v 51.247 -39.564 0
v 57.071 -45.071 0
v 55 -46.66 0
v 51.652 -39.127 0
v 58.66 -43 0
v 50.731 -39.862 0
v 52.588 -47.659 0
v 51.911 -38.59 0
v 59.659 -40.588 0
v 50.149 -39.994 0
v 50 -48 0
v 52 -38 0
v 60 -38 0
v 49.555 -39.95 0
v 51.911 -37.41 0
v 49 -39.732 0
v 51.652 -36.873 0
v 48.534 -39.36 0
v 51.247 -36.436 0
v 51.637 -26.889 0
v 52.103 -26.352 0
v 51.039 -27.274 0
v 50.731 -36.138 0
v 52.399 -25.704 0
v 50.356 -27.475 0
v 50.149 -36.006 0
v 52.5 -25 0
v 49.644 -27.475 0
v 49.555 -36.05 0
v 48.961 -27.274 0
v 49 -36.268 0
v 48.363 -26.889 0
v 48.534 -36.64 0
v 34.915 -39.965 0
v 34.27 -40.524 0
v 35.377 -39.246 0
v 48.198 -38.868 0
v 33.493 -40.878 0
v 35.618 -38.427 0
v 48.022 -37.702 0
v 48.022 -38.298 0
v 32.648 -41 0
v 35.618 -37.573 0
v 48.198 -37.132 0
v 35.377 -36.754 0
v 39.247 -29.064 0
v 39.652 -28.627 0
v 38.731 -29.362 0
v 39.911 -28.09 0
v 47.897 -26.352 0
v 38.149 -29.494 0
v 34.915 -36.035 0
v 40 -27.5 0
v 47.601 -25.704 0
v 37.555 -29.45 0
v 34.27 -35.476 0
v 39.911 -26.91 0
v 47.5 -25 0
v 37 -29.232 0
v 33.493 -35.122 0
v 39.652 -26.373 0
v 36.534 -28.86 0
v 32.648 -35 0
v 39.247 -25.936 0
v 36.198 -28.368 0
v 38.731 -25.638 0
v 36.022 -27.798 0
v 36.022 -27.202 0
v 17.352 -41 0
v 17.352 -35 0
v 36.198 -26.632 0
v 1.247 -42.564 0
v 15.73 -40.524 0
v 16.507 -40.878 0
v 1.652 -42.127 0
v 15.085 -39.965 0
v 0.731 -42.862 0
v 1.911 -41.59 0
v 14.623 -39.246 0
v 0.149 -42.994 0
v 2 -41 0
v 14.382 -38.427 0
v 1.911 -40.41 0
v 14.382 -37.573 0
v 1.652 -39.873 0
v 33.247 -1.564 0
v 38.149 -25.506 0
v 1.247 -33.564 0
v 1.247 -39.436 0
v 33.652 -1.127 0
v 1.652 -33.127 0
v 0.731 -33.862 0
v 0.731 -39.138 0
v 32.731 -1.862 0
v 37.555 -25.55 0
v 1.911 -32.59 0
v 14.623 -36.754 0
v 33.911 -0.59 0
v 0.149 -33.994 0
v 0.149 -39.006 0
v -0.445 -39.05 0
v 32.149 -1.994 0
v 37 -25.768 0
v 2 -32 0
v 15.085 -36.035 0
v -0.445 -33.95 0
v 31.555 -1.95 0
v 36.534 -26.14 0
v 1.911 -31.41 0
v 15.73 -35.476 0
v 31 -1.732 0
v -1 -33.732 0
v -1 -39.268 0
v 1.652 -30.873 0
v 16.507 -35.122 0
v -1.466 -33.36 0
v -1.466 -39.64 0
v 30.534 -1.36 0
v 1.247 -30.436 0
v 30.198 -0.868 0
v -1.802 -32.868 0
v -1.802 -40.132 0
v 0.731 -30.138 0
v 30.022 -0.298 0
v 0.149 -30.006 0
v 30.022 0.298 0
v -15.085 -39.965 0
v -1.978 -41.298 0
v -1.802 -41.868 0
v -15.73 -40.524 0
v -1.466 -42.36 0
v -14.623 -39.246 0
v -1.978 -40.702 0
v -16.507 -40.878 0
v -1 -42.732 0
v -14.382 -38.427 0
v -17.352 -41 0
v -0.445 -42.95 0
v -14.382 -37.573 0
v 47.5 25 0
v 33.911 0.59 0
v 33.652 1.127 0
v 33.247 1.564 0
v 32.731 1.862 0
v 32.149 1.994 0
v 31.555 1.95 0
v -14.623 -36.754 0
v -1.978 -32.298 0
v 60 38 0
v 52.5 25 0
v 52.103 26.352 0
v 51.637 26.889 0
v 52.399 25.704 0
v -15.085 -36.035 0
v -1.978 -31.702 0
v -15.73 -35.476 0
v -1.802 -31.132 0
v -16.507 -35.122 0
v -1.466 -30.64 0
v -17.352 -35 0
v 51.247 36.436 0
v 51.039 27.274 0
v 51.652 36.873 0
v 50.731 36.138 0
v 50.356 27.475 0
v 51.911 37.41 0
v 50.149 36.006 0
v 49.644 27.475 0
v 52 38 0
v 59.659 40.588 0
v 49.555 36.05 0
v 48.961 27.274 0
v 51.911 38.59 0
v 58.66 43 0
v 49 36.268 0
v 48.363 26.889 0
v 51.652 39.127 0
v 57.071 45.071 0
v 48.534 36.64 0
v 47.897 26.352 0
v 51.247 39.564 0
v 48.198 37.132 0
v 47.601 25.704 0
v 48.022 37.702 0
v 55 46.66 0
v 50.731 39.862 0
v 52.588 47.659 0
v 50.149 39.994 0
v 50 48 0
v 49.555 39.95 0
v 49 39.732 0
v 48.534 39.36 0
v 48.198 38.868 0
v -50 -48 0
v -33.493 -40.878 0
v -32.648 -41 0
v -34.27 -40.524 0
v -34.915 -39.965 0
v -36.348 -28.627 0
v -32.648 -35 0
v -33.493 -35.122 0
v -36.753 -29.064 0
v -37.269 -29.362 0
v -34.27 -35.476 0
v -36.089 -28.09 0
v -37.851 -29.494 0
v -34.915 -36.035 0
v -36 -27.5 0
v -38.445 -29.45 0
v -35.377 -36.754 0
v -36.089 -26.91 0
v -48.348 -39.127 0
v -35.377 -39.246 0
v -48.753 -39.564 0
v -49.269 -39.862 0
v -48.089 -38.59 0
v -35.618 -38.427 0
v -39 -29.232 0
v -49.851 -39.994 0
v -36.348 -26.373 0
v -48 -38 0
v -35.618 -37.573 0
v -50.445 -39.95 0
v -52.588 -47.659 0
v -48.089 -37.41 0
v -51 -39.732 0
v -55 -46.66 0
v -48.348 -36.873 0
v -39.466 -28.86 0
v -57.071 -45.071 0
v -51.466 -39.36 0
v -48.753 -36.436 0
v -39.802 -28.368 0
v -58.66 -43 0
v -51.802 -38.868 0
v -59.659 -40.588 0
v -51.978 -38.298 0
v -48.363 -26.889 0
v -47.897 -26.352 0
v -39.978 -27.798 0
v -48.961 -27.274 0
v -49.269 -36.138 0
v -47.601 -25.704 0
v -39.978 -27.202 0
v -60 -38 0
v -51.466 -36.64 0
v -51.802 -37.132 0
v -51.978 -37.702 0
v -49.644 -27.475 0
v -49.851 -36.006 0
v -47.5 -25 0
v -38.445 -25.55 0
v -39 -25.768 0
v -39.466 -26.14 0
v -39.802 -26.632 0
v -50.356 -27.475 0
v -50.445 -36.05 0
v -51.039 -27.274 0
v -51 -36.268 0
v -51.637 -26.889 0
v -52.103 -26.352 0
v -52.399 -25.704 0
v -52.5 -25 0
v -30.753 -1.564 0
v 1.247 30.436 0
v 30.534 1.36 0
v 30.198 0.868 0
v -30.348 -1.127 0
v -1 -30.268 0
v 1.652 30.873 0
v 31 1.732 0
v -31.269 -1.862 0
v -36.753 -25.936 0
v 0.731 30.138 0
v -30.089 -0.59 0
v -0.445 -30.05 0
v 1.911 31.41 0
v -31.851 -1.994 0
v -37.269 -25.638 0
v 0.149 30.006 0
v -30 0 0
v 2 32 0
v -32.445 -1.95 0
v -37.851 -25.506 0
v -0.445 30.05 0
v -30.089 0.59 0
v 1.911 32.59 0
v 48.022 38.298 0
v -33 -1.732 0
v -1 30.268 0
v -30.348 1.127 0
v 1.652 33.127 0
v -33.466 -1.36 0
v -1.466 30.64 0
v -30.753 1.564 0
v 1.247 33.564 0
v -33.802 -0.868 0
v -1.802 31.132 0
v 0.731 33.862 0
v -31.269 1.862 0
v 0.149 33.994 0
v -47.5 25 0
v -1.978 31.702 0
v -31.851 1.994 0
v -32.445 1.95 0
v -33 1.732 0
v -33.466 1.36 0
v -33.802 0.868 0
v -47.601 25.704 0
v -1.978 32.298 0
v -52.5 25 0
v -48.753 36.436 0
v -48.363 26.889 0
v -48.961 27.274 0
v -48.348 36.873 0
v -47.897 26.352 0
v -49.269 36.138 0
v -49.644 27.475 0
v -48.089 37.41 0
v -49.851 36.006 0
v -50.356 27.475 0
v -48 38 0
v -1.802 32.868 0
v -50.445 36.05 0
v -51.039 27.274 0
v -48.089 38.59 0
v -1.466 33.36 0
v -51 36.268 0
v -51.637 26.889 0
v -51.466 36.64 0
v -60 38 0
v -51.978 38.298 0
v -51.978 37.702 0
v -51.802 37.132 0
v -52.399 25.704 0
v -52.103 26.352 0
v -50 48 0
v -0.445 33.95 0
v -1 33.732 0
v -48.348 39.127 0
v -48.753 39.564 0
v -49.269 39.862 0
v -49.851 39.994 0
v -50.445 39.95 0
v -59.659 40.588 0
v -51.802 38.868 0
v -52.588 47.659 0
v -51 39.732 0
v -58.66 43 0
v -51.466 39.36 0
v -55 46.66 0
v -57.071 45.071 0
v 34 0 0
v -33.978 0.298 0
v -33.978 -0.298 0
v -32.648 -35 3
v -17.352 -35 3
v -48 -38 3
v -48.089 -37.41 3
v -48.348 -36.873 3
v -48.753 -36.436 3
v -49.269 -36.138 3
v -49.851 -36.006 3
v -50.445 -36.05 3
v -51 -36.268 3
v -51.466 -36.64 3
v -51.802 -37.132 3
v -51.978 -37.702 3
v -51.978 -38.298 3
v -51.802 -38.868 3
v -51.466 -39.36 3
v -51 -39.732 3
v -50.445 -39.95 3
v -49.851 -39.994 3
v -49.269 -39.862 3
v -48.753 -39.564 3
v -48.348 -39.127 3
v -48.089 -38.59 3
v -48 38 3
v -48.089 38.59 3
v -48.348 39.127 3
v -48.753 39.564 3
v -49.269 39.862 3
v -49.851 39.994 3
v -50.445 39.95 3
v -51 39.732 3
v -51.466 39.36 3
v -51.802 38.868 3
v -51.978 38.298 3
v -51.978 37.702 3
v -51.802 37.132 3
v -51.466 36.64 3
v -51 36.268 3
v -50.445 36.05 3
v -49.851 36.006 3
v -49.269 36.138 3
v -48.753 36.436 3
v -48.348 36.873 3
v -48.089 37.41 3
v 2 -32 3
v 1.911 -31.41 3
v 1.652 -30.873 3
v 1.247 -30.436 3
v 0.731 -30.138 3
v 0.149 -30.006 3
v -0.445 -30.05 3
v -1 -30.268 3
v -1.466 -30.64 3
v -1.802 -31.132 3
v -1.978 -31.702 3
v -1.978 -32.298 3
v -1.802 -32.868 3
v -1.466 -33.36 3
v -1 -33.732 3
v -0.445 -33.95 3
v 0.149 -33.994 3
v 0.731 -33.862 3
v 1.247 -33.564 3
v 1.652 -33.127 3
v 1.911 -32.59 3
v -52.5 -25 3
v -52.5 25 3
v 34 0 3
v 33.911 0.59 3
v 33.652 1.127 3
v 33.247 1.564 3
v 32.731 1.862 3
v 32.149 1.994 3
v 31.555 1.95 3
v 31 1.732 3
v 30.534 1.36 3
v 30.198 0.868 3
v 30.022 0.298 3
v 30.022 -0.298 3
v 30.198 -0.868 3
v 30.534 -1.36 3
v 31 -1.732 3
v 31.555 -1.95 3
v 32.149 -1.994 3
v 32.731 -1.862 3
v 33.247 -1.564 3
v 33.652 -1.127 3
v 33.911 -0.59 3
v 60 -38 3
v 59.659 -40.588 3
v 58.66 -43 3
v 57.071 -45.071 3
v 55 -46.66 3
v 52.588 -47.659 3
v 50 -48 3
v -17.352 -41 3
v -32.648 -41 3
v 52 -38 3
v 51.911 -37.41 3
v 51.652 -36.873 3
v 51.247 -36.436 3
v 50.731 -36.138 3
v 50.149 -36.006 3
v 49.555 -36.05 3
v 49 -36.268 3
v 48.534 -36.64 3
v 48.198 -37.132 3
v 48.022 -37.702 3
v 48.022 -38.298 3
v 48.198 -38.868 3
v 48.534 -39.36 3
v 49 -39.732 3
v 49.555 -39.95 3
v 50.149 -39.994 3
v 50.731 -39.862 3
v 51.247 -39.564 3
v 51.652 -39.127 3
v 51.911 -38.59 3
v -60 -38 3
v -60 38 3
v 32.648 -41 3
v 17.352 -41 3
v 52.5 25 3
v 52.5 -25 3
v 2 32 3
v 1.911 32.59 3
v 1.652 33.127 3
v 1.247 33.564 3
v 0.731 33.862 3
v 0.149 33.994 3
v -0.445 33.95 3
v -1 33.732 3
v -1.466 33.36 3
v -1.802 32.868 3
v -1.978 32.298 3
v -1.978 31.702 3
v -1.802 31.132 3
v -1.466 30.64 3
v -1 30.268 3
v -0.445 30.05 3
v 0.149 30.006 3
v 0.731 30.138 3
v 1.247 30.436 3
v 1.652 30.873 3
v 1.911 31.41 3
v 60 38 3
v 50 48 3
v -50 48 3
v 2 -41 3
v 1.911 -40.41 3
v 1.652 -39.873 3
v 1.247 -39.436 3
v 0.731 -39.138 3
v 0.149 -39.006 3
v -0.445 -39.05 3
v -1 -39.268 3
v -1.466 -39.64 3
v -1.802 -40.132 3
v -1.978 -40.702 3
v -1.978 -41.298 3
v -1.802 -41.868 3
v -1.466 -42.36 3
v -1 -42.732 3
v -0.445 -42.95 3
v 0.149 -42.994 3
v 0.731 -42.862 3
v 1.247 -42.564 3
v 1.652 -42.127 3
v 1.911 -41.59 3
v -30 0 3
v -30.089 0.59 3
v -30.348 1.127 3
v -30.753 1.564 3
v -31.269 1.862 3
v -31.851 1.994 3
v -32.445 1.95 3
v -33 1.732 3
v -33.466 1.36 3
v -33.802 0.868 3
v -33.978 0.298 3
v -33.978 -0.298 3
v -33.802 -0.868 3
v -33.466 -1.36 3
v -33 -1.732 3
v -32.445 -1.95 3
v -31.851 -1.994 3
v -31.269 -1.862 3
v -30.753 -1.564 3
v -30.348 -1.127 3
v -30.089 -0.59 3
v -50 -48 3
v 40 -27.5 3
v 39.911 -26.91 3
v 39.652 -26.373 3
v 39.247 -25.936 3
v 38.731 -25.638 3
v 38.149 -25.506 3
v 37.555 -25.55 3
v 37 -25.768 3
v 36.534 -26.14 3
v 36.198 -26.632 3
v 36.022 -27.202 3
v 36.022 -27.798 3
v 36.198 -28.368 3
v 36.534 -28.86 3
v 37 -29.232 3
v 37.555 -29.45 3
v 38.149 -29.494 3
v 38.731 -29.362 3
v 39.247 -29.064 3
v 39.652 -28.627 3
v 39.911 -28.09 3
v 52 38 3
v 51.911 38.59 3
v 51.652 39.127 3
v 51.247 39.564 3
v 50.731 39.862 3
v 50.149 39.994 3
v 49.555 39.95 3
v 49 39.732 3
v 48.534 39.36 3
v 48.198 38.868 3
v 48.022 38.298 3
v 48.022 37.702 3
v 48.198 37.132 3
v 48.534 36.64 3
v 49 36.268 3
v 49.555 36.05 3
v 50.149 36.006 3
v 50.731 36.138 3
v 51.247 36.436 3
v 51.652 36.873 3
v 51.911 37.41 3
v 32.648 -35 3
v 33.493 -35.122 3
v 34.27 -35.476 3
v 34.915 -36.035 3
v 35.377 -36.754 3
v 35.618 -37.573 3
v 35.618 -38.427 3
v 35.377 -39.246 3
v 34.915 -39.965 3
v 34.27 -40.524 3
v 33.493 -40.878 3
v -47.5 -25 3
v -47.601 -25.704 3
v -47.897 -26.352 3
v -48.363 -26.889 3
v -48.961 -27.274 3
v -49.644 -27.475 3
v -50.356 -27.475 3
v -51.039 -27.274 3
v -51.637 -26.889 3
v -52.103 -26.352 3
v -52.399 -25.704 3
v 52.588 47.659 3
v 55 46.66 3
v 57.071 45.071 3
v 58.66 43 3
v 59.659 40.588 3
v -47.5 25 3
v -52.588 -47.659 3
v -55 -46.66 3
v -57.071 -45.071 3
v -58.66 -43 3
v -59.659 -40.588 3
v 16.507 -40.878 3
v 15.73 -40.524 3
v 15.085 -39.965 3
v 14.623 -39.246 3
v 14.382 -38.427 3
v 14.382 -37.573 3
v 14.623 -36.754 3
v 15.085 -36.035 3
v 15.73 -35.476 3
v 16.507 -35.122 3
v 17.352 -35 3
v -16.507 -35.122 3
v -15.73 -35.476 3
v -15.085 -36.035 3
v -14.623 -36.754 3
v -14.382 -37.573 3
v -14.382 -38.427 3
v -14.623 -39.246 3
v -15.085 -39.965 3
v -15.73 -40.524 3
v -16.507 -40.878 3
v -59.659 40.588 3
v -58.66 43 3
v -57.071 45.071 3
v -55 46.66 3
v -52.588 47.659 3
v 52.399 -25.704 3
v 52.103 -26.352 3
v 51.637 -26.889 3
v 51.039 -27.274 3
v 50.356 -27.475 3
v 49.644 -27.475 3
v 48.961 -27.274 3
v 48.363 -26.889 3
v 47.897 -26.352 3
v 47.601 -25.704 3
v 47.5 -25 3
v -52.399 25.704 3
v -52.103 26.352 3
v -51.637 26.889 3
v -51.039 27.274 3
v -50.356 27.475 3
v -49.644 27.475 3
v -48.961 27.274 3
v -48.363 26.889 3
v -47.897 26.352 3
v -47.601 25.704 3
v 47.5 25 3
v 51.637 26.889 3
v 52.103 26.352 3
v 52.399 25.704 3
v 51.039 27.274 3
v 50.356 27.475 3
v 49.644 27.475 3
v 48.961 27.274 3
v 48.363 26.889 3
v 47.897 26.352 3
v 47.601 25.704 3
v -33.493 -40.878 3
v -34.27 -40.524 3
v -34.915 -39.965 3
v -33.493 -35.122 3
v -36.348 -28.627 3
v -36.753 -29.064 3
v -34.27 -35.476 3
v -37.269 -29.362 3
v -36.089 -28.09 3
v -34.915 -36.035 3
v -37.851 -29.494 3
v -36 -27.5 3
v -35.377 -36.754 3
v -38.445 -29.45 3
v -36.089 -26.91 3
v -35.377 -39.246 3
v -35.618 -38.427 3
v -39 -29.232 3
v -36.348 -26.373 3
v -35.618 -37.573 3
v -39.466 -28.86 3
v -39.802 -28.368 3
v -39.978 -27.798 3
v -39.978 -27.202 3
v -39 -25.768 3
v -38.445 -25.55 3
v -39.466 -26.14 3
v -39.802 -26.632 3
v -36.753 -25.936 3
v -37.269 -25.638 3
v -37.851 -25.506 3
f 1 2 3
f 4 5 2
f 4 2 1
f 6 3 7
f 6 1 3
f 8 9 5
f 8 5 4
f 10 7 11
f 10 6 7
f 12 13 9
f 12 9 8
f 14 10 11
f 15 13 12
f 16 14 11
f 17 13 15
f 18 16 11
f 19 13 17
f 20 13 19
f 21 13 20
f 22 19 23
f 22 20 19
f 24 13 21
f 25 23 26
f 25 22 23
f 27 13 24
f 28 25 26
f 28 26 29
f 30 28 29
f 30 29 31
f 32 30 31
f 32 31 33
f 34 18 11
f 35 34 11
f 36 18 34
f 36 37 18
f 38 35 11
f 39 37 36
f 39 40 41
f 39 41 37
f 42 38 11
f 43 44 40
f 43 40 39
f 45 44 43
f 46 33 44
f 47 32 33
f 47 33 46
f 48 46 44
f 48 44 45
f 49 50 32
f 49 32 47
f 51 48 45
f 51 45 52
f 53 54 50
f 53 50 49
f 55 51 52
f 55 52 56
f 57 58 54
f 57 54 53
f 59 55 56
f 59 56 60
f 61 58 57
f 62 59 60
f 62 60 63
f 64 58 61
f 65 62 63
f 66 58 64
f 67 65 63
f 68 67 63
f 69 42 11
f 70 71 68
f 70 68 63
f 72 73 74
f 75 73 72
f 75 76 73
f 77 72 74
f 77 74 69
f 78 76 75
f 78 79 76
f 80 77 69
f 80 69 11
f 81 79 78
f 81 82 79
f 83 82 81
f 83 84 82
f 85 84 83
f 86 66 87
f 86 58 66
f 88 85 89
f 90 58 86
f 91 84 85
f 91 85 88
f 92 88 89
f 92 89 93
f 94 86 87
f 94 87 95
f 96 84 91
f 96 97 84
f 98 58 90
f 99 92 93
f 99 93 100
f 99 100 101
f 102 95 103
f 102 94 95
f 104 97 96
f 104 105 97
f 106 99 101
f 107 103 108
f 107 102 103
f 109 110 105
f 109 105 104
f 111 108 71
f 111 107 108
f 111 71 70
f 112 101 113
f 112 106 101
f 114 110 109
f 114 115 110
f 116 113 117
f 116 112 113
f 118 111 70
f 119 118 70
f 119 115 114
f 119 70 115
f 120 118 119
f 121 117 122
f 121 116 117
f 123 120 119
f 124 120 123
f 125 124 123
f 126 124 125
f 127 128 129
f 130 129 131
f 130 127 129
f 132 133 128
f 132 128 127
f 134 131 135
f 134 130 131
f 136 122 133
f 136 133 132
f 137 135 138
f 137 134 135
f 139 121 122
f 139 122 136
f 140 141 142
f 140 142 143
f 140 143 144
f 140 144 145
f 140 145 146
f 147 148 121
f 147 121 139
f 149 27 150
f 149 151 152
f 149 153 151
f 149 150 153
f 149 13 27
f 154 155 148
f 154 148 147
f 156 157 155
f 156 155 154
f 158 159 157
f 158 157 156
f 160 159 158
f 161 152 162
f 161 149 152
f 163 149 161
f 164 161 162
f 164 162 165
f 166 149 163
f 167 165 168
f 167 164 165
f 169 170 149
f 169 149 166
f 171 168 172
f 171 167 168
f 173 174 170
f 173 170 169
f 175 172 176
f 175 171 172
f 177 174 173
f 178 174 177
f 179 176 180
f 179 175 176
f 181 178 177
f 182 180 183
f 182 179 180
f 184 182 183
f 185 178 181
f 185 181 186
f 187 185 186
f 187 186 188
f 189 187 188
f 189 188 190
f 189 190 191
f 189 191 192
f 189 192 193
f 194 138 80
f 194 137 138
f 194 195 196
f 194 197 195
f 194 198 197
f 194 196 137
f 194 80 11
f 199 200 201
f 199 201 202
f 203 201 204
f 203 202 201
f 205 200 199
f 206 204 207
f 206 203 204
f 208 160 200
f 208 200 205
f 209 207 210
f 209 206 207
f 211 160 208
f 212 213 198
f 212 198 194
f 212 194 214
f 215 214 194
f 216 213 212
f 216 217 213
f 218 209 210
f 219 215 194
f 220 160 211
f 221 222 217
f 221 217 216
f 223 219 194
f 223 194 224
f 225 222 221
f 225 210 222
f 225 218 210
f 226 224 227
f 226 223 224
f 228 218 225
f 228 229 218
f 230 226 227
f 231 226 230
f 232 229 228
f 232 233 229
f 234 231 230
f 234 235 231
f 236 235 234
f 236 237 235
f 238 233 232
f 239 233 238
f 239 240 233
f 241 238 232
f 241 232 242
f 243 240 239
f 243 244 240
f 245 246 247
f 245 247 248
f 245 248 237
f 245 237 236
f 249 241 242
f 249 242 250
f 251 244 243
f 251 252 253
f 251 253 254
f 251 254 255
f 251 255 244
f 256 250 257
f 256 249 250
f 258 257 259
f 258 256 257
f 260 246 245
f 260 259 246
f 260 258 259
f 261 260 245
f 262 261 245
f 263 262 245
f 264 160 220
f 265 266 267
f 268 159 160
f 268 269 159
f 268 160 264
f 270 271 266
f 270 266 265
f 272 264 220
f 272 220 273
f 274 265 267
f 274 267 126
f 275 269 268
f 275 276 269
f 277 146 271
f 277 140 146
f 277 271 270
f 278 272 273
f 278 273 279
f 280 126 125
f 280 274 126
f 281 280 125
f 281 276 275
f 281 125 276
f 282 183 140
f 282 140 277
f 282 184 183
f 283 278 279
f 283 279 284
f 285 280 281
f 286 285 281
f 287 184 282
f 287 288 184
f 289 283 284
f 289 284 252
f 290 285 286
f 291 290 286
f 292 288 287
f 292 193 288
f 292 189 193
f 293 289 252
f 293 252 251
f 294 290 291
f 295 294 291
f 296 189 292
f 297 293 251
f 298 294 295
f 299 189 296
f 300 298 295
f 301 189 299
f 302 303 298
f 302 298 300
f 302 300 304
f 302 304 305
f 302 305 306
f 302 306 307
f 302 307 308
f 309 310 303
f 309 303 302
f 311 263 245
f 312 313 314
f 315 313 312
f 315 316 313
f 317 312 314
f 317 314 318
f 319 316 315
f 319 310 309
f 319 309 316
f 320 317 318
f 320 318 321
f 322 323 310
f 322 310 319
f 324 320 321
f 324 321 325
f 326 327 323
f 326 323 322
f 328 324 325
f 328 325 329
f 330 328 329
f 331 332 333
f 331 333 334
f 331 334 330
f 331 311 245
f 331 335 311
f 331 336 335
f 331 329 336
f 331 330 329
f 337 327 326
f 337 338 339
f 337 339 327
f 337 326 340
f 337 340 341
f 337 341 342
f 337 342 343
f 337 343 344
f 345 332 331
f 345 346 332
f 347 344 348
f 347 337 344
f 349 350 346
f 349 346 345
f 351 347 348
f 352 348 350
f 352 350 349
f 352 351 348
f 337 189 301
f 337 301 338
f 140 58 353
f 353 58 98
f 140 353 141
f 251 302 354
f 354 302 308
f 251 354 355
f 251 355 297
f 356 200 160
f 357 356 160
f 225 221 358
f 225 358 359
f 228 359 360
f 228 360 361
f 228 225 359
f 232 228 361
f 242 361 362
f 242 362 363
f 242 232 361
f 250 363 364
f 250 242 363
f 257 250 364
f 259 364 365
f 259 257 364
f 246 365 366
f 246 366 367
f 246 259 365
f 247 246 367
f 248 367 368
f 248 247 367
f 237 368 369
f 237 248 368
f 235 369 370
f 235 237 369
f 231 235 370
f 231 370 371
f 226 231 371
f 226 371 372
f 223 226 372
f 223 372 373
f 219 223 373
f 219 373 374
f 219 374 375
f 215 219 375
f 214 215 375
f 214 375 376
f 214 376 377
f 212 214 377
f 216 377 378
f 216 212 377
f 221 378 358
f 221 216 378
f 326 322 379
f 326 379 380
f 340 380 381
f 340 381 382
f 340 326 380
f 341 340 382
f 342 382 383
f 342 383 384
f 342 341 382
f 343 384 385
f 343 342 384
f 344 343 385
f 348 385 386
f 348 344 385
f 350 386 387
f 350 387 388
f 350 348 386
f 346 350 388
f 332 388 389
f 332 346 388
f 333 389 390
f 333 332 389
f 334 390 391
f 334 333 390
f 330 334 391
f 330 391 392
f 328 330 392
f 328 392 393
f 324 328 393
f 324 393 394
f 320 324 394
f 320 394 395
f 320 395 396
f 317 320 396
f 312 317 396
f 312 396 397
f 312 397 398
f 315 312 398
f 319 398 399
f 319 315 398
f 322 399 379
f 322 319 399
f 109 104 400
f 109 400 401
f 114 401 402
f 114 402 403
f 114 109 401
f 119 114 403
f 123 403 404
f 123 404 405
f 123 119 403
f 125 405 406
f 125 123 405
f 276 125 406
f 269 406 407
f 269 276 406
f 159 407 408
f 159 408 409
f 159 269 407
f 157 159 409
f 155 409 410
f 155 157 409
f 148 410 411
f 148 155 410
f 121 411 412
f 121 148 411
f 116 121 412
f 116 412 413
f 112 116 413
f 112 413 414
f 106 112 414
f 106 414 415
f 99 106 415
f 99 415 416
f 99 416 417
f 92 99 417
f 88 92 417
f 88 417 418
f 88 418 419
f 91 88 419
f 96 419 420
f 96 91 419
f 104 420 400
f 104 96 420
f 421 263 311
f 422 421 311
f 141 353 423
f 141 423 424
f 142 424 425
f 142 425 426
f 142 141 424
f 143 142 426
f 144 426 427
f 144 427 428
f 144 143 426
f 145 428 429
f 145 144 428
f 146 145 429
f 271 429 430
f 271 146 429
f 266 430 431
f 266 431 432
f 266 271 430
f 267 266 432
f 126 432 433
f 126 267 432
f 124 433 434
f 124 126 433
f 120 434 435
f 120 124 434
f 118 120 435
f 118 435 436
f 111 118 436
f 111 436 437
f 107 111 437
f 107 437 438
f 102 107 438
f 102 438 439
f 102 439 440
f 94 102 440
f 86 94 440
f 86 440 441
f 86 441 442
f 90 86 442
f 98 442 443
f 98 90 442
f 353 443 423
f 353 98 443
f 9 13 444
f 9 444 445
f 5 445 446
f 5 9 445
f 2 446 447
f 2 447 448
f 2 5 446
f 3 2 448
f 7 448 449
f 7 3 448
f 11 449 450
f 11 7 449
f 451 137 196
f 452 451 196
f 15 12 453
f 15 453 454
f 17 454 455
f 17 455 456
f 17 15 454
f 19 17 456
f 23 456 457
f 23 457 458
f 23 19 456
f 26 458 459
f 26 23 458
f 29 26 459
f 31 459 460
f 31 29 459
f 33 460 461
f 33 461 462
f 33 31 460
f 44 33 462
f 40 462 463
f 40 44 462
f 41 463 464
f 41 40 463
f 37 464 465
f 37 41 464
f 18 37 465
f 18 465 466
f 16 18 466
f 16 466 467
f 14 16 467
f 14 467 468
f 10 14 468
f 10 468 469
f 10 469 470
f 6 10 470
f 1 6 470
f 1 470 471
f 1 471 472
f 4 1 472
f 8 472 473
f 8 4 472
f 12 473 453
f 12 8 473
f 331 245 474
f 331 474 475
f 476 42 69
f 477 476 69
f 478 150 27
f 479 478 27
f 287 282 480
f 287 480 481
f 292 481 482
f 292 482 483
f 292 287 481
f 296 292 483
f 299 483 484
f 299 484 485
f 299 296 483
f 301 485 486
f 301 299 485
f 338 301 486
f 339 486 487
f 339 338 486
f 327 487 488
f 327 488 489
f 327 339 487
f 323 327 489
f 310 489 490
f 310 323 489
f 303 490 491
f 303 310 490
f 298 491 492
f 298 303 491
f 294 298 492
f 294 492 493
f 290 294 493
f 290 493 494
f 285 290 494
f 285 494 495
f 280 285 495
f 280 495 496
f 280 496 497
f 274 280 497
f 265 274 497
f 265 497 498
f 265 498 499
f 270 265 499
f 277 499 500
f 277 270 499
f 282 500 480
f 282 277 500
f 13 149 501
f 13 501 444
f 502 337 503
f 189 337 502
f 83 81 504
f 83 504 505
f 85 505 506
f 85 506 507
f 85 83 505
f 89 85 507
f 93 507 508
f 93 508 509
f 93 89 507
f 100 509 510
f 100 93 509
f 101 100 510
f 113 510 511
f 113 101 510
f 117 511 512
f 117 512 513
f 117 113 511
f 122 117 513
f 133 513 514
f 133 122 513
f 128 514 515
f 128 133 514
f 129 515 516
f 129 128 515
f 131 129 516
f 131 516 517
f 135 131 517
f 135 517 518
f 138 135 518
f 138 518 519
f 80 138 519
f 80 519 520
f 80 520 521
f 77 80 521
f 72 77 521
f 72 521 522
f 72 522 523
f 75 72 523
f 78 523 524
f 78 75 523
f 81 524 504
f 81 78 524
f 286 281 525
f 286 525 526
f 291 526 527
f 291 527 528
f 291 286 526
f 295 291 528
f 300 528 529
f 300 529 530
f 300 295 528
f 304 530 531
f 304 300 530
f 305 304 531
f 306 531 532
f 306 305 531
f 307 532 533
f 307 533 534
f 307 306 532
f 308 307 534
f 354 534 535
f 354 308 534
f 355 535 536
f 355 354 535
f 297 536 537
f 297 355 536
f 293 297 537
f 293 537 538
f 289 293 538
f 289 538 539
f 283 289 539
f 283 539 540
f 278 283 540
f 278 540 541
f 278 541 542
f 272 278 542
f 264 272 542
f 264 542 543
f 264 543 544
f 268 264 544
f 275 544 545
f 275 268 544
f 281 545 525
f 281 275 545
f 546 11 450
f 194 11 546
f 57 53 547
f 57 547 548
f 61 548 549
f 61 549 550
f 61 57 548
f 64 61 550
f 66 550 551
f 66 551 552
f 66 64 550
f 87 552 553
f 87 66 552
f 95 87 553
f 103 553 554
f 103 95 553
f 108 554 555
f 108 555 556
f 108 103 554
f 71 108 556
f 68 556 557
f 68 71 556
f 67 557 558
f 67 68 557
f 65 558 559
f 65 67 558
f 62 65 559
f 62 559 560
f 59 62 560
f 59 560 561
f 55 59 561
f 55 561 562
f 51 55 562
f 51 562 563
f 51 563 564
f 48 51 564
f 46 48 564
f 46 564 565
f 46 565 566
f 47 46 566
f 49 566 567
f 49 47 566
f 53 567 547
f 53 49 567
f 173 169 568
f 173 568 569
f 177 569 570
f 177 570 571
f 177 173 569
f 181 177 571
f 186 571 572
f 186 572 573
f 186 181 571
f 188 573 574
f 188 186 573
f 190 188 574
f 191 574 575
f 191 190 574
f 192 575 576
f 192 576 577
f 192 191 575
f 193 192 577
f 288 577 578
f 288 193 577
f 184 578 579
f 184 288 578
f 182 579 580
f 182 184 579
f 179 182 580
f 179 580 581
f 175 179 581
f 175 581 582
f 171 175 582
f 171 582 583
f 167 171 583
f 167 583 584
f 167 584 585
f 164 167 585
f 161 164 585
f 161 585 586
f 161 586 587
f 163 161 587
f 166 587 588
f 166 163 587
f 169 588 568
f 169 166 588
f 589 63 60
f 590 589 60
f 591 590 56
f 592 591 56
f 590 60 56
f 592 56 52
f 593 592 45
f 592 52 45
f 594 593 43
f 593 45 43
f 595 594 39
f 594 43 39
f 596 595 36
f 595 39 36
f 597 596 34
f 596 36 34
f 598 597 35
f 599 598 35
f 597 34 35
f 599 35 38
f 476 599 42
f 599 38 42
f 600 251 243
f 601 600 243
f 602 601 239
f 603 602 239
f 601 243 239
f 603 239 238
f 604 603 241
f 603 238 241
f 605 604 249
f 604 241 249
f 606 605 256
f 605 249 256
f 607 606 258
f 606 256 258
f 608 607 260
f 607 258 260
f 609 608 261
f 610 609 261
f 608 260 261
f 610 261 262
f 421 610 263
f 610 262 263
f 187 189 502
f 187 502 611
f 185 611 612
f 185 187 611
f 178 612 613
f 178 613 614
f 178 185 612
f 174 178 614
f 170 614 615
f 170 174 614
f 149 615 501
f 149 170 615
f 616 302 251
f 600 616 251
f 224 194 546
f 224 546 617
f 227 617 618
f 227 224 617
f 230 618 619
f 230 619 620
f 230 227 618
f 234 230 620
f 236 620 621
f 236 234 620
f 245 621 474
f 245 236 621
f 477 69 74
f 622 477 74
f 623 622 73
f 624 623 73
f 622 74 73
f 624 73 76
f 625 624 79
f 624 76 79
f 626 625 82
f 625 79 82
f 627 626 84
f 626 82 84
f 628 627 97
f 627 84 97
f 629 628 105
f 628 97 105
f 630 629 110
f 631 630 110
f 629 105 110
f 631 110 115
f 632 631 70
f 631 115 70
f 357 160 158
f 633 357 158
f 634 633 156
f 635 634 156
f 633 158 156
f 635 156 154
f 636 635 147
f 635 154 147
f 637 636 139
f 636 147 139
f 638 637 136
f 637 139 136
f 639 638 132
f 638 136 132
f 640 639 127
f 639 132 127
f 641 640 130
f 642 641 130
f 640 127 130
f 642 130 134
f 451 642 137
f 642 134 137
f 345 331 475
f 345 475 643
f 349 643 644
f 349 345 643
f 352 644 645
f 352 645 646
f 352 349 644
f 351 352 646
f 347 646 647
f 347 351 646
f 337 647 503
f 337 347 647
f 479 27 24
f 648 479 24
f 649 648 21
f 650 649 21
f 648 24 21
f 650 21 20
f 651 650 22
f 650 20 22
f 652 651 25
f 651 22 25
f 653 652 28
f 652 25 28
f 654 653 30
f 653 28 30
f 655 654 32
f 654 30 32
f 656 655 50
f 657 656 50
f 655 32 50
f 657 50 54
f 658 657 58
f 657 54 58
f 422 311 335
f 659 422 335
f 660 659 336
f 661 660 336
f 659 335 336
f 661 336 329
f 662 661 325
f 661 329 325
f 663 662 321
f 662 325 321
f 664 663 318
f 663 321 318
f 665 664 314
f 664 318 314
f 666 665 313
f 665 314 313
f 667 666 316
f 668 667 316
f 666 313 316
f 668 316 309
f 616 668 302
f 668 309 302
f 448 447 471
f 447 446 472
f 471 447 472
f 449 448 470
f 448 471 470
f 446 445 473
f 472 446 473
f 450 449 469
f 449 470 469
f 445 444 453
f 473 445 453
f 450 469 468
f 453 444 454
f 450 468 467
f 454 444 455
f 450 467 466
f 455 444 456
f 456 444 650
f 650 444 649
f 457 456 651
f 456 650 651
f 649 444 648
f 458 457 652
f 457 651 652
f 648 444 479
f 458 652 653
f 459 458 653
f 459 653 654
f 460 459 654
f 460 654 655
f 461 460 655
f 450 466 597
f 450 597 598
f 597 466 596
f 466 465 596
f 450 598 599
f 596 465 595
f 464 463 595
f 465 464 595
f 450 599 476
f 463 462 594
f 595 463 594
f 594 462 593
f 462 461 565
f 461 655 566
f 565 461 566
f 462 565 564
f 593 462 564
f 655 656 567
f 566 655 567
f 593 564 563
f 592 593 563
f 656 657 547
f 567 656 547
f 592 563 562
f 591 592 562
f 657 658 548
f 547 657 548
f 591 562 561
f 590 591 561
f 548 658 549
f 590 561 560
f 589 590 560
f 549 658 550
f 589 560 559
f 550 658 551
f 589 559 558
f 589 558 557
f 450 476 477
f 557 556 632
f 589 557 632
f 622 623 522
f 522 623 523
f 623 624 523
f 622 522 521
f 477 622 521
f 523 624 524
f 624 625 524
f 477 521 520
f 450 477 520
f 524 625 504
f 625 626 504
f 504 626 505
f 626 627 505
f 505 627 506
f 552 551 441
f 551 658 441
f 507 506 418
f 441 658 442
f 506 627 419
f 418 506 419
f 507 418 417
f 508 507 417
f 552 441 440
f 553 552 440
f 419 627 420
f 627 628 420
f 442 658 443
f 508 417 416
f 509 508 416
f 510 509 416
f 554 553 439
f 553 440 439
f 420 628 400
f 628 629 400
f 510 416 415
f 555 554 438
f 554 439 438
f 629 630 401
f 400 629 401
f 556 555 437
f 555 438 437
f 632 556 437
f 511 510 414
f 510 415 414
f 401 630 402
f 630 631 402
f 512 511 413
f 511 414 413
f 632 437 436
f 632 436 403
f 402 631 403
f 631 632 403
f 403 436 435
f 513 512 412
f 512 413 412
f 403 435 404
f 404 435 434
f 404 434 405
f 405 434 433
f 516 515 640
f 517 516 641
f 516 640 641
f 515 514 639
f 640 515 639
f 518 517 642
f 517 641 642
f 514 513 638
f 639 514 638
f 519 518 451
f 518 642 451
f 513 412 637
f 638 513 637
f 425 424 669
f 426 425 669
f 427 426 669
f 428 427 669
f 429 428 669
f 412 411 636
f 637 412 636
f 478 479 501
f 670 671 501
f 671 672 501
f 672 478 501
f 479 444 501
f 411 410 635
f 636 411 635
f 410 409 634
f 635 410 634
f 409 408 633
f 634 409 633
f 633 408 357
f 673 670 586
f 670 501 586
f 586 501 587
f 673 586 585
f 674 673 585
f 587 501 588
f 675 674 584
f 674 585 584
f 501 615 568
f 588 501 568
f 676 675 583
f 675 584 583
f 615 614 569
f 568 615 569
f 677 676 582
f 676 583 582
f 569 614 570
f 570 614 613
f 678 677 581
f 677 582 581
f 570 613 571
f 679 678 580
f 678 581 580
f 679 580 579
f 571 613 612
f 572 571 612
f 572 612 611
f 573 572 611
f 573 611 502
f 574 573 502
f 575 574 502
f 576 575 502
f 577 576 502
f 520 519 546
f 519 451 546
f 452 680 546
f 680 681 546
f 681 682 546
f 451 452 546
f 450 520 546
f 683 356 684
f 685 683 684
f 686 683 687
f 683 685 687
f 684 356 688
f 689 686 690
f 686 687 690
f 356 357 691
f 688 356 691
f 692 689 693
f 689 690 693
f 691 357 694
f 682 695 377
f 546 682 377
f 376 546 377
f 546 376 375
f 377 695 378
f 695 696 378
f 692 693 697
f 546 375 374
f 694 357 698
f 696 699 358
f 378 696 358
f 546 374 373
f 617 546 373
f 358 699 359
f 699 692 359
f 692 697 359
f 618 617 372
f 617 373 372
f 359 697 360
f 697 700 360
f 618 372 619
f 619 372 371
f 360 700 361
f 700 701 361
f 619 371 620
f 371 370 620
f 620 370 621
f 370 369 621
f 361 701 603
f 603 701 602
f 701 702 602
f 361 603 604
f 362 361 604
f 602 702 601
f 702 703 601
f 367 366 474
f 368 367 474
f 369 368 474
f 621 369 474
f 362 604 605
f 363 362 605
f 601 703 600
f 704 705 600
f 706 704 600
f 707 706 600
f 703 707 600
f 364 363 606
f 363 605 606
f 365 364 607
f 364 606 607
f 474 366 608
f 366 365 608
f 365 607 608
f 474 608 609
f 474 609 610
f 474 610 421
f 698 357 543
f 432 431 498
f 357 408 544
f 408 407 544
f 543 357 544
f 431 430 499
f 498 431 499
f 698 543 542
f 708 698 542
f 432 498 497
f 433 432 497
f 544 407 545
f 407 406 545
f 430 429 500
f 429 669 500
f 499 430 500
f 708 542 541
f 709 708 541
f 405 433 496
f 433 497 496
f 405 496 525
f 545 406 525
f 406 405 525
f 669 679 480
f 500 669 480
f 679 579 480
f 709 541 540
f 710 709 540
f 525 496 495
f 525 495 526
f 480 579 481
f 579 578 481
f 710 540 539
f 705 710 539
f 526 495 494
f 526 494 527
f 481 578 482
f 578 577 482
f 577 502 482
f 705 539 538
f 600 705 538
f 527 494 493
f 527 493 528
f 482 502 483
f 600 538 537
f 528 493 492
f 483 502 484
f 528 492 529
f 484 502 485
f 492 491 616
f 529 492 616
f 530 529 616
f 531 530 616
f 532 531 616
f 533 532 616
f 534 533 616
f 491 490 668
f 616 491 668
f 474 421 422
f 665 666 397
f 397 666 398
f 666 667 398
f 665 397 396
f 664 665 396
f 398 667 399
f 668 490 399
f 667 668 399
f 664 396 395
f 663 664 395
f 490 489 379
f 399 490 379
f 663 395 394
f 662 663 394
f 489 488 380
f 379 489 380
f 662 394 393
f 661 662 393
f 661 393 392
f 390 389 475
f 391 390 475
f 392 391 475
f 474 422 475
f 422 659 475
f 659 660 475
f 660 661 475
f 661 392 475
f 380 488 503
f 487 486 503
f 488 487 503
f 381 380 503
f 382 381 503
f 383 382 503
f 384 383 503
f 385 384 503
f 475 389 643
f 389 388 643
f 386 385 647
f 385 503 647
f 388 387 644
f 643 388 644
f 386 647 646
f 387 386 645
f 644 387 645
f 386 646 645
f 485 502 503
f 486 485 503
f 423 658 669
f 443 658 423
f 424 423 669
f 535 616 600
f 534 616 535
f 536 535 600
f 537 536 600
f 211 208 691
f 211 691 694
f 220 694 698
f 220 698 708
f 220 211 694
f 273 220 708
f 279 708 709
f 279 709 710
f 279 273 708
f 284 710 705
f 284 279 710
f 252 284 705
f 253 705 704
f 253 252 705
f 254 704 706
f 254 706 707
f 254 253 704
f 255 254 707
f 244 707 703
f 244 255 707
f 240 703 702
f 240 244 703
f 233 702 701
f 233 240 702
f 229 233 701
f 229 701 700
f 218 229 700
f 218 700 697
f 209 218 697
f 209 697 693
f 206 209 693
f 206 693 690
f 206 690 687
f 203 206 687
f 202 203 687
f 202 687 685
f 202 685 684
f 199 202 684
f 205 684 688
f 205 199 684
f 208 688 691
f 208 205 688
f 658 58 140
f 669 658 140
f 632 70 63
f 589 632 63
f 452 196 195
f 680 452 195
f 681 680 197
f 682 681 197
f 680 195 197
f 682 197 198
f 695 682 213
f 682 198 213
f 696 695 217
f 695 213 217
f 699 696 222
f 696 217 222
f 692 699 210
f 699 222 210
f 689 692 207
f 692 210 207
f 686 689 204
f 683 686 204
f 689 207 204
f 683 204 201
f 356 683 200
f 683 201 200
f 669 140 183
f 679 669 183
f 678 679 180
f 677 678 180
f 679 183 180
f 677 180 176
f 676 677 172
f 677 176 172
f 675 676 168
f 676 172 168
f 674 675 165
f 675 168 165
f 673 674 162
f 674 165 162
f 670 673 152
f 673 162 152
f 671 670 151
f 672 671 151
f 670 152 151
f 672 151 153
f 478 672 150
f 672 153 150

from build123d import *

# Parameters (mm, degrees)
SKETCH1_R           = 2
BOSS_EXTRUDE1_DEPTH = 3


with BuildPart() as part:
    # Sketch1 → Boss-Extrude1 (new body)
    with BuildSketch(Plane.XY):
        with BuildLine():
            Line((-50, 48), (50, 48))
            ThreePointArc((50, 48), (57.071067812, 45.071067812), (60, 38))
            Line((60, 38), (60, -38))
            ThreePointArc((60, -38), (57.071067812, -45.071067812), (50, -48))
            Line((50, -48), (-50, -48))
            ThreePointArc((-50, -48), (-57.071067812, -45.071067812), (-60, -38))
            Line((-60, -38), (-60, 38))
            ThreePointArc((-60, 38), (-57.071067812, 45.071067812), (-50, 48))
        make_face()
        with Locations((0, 32)):
            Circle(SKETCH1_R, mode=Mode.SUBTRACT)
        with Locations((0, -32)):
            Circle(SKETCH1_R, mode=Mode.SUBTRACT)
        with Locations((32, 0)):
            Circle(SKETCH1_R, mode=Mode.SUBTRACT)
        with Locations((-32, 0)):
            Circle(SKETCH1_R, mode=Mode.SUBTRACT)
        with Locations((-50, 38)):
            Circle(SKETCH1_R, mode=Mode.SUBTRACT)
        with Locations((50, 38)):
            Circle(SKETCH1_R, mode=Mode.SUBTRACT)
        with Locations((50, -38)):
            Circle(SKETCH1_R, mode=Mode.SUBTRACT)
        with Locations((-50, -38)):
            Circle(SKETCH1_R, mode=Mode.SUBTRACT)
        with Locations((-38, -27.5)):
            Circle(SKETCH1_R, mode=Mode.SUBTRACT)
        with Locations((38, -27.5)):
            Circle(SKETCH1_R, mode=Mode.SUBTRACT)
        with Locations((0, -41)):
            Circle(SKETCH1_R, mode=Mode.SUBTRACT)
        with BuildLine():
            Line((17.35191045, -35), (32.64808955, -35))
            ThreePointArc((32.64808955, -35), (35.64808955, -38), (32.64808955, -41))
            Line((32.64808955, -41), (17.35191045, -41))
            ThreePointArc((17.35191045, -41), (14.35191045, -38), (17.35191045, -35))
        make_face(mode=Mode.SUBTRACT)
        with BuildLine():
            Line((52.5, 25), (52.5, -25))
            ThreePointArc((52.5, -25), (50, -27.5), (47.5, -25))
            Line((47.5, -25), (47.5, 25))
            ThreePointArc((47.5, 25), (50, 27.5), (52.5, 25))
        make_face(mode=Mode.SUBTRACT)
        with BuildLine():
            Line((-47.5, 25), (-47.5, -25))
            ThreePointArc((-47.5, -25), (-50, -27.5), (-52.5, -25))
            Line((-52.5, -25), (-52.5, 25))
            ThreePointArc((-52.5, 25), (-50, 27.5), (-47.5, 25))
        make_face(mode=Mode.SUBTRACT)
        with BuildLine():
            Line((-32.64808955, -35), (-17.35191045, -35))
            ThreePointArc((-17.35191045, -35), (-14.35191045, -38), (-17.35191045, -41))
            Line((-17.35191045, -41), (-32.64808955, -41))
            ThreePointArc((-32.64808955, -41), (-35.64808955, -38), (-32.64808955, -35))
        make_face(mode=Mode.SUBTRACT)
    extrude(amount=BOSS_EXTRUDE1_DEPTH)


solid = part.part
